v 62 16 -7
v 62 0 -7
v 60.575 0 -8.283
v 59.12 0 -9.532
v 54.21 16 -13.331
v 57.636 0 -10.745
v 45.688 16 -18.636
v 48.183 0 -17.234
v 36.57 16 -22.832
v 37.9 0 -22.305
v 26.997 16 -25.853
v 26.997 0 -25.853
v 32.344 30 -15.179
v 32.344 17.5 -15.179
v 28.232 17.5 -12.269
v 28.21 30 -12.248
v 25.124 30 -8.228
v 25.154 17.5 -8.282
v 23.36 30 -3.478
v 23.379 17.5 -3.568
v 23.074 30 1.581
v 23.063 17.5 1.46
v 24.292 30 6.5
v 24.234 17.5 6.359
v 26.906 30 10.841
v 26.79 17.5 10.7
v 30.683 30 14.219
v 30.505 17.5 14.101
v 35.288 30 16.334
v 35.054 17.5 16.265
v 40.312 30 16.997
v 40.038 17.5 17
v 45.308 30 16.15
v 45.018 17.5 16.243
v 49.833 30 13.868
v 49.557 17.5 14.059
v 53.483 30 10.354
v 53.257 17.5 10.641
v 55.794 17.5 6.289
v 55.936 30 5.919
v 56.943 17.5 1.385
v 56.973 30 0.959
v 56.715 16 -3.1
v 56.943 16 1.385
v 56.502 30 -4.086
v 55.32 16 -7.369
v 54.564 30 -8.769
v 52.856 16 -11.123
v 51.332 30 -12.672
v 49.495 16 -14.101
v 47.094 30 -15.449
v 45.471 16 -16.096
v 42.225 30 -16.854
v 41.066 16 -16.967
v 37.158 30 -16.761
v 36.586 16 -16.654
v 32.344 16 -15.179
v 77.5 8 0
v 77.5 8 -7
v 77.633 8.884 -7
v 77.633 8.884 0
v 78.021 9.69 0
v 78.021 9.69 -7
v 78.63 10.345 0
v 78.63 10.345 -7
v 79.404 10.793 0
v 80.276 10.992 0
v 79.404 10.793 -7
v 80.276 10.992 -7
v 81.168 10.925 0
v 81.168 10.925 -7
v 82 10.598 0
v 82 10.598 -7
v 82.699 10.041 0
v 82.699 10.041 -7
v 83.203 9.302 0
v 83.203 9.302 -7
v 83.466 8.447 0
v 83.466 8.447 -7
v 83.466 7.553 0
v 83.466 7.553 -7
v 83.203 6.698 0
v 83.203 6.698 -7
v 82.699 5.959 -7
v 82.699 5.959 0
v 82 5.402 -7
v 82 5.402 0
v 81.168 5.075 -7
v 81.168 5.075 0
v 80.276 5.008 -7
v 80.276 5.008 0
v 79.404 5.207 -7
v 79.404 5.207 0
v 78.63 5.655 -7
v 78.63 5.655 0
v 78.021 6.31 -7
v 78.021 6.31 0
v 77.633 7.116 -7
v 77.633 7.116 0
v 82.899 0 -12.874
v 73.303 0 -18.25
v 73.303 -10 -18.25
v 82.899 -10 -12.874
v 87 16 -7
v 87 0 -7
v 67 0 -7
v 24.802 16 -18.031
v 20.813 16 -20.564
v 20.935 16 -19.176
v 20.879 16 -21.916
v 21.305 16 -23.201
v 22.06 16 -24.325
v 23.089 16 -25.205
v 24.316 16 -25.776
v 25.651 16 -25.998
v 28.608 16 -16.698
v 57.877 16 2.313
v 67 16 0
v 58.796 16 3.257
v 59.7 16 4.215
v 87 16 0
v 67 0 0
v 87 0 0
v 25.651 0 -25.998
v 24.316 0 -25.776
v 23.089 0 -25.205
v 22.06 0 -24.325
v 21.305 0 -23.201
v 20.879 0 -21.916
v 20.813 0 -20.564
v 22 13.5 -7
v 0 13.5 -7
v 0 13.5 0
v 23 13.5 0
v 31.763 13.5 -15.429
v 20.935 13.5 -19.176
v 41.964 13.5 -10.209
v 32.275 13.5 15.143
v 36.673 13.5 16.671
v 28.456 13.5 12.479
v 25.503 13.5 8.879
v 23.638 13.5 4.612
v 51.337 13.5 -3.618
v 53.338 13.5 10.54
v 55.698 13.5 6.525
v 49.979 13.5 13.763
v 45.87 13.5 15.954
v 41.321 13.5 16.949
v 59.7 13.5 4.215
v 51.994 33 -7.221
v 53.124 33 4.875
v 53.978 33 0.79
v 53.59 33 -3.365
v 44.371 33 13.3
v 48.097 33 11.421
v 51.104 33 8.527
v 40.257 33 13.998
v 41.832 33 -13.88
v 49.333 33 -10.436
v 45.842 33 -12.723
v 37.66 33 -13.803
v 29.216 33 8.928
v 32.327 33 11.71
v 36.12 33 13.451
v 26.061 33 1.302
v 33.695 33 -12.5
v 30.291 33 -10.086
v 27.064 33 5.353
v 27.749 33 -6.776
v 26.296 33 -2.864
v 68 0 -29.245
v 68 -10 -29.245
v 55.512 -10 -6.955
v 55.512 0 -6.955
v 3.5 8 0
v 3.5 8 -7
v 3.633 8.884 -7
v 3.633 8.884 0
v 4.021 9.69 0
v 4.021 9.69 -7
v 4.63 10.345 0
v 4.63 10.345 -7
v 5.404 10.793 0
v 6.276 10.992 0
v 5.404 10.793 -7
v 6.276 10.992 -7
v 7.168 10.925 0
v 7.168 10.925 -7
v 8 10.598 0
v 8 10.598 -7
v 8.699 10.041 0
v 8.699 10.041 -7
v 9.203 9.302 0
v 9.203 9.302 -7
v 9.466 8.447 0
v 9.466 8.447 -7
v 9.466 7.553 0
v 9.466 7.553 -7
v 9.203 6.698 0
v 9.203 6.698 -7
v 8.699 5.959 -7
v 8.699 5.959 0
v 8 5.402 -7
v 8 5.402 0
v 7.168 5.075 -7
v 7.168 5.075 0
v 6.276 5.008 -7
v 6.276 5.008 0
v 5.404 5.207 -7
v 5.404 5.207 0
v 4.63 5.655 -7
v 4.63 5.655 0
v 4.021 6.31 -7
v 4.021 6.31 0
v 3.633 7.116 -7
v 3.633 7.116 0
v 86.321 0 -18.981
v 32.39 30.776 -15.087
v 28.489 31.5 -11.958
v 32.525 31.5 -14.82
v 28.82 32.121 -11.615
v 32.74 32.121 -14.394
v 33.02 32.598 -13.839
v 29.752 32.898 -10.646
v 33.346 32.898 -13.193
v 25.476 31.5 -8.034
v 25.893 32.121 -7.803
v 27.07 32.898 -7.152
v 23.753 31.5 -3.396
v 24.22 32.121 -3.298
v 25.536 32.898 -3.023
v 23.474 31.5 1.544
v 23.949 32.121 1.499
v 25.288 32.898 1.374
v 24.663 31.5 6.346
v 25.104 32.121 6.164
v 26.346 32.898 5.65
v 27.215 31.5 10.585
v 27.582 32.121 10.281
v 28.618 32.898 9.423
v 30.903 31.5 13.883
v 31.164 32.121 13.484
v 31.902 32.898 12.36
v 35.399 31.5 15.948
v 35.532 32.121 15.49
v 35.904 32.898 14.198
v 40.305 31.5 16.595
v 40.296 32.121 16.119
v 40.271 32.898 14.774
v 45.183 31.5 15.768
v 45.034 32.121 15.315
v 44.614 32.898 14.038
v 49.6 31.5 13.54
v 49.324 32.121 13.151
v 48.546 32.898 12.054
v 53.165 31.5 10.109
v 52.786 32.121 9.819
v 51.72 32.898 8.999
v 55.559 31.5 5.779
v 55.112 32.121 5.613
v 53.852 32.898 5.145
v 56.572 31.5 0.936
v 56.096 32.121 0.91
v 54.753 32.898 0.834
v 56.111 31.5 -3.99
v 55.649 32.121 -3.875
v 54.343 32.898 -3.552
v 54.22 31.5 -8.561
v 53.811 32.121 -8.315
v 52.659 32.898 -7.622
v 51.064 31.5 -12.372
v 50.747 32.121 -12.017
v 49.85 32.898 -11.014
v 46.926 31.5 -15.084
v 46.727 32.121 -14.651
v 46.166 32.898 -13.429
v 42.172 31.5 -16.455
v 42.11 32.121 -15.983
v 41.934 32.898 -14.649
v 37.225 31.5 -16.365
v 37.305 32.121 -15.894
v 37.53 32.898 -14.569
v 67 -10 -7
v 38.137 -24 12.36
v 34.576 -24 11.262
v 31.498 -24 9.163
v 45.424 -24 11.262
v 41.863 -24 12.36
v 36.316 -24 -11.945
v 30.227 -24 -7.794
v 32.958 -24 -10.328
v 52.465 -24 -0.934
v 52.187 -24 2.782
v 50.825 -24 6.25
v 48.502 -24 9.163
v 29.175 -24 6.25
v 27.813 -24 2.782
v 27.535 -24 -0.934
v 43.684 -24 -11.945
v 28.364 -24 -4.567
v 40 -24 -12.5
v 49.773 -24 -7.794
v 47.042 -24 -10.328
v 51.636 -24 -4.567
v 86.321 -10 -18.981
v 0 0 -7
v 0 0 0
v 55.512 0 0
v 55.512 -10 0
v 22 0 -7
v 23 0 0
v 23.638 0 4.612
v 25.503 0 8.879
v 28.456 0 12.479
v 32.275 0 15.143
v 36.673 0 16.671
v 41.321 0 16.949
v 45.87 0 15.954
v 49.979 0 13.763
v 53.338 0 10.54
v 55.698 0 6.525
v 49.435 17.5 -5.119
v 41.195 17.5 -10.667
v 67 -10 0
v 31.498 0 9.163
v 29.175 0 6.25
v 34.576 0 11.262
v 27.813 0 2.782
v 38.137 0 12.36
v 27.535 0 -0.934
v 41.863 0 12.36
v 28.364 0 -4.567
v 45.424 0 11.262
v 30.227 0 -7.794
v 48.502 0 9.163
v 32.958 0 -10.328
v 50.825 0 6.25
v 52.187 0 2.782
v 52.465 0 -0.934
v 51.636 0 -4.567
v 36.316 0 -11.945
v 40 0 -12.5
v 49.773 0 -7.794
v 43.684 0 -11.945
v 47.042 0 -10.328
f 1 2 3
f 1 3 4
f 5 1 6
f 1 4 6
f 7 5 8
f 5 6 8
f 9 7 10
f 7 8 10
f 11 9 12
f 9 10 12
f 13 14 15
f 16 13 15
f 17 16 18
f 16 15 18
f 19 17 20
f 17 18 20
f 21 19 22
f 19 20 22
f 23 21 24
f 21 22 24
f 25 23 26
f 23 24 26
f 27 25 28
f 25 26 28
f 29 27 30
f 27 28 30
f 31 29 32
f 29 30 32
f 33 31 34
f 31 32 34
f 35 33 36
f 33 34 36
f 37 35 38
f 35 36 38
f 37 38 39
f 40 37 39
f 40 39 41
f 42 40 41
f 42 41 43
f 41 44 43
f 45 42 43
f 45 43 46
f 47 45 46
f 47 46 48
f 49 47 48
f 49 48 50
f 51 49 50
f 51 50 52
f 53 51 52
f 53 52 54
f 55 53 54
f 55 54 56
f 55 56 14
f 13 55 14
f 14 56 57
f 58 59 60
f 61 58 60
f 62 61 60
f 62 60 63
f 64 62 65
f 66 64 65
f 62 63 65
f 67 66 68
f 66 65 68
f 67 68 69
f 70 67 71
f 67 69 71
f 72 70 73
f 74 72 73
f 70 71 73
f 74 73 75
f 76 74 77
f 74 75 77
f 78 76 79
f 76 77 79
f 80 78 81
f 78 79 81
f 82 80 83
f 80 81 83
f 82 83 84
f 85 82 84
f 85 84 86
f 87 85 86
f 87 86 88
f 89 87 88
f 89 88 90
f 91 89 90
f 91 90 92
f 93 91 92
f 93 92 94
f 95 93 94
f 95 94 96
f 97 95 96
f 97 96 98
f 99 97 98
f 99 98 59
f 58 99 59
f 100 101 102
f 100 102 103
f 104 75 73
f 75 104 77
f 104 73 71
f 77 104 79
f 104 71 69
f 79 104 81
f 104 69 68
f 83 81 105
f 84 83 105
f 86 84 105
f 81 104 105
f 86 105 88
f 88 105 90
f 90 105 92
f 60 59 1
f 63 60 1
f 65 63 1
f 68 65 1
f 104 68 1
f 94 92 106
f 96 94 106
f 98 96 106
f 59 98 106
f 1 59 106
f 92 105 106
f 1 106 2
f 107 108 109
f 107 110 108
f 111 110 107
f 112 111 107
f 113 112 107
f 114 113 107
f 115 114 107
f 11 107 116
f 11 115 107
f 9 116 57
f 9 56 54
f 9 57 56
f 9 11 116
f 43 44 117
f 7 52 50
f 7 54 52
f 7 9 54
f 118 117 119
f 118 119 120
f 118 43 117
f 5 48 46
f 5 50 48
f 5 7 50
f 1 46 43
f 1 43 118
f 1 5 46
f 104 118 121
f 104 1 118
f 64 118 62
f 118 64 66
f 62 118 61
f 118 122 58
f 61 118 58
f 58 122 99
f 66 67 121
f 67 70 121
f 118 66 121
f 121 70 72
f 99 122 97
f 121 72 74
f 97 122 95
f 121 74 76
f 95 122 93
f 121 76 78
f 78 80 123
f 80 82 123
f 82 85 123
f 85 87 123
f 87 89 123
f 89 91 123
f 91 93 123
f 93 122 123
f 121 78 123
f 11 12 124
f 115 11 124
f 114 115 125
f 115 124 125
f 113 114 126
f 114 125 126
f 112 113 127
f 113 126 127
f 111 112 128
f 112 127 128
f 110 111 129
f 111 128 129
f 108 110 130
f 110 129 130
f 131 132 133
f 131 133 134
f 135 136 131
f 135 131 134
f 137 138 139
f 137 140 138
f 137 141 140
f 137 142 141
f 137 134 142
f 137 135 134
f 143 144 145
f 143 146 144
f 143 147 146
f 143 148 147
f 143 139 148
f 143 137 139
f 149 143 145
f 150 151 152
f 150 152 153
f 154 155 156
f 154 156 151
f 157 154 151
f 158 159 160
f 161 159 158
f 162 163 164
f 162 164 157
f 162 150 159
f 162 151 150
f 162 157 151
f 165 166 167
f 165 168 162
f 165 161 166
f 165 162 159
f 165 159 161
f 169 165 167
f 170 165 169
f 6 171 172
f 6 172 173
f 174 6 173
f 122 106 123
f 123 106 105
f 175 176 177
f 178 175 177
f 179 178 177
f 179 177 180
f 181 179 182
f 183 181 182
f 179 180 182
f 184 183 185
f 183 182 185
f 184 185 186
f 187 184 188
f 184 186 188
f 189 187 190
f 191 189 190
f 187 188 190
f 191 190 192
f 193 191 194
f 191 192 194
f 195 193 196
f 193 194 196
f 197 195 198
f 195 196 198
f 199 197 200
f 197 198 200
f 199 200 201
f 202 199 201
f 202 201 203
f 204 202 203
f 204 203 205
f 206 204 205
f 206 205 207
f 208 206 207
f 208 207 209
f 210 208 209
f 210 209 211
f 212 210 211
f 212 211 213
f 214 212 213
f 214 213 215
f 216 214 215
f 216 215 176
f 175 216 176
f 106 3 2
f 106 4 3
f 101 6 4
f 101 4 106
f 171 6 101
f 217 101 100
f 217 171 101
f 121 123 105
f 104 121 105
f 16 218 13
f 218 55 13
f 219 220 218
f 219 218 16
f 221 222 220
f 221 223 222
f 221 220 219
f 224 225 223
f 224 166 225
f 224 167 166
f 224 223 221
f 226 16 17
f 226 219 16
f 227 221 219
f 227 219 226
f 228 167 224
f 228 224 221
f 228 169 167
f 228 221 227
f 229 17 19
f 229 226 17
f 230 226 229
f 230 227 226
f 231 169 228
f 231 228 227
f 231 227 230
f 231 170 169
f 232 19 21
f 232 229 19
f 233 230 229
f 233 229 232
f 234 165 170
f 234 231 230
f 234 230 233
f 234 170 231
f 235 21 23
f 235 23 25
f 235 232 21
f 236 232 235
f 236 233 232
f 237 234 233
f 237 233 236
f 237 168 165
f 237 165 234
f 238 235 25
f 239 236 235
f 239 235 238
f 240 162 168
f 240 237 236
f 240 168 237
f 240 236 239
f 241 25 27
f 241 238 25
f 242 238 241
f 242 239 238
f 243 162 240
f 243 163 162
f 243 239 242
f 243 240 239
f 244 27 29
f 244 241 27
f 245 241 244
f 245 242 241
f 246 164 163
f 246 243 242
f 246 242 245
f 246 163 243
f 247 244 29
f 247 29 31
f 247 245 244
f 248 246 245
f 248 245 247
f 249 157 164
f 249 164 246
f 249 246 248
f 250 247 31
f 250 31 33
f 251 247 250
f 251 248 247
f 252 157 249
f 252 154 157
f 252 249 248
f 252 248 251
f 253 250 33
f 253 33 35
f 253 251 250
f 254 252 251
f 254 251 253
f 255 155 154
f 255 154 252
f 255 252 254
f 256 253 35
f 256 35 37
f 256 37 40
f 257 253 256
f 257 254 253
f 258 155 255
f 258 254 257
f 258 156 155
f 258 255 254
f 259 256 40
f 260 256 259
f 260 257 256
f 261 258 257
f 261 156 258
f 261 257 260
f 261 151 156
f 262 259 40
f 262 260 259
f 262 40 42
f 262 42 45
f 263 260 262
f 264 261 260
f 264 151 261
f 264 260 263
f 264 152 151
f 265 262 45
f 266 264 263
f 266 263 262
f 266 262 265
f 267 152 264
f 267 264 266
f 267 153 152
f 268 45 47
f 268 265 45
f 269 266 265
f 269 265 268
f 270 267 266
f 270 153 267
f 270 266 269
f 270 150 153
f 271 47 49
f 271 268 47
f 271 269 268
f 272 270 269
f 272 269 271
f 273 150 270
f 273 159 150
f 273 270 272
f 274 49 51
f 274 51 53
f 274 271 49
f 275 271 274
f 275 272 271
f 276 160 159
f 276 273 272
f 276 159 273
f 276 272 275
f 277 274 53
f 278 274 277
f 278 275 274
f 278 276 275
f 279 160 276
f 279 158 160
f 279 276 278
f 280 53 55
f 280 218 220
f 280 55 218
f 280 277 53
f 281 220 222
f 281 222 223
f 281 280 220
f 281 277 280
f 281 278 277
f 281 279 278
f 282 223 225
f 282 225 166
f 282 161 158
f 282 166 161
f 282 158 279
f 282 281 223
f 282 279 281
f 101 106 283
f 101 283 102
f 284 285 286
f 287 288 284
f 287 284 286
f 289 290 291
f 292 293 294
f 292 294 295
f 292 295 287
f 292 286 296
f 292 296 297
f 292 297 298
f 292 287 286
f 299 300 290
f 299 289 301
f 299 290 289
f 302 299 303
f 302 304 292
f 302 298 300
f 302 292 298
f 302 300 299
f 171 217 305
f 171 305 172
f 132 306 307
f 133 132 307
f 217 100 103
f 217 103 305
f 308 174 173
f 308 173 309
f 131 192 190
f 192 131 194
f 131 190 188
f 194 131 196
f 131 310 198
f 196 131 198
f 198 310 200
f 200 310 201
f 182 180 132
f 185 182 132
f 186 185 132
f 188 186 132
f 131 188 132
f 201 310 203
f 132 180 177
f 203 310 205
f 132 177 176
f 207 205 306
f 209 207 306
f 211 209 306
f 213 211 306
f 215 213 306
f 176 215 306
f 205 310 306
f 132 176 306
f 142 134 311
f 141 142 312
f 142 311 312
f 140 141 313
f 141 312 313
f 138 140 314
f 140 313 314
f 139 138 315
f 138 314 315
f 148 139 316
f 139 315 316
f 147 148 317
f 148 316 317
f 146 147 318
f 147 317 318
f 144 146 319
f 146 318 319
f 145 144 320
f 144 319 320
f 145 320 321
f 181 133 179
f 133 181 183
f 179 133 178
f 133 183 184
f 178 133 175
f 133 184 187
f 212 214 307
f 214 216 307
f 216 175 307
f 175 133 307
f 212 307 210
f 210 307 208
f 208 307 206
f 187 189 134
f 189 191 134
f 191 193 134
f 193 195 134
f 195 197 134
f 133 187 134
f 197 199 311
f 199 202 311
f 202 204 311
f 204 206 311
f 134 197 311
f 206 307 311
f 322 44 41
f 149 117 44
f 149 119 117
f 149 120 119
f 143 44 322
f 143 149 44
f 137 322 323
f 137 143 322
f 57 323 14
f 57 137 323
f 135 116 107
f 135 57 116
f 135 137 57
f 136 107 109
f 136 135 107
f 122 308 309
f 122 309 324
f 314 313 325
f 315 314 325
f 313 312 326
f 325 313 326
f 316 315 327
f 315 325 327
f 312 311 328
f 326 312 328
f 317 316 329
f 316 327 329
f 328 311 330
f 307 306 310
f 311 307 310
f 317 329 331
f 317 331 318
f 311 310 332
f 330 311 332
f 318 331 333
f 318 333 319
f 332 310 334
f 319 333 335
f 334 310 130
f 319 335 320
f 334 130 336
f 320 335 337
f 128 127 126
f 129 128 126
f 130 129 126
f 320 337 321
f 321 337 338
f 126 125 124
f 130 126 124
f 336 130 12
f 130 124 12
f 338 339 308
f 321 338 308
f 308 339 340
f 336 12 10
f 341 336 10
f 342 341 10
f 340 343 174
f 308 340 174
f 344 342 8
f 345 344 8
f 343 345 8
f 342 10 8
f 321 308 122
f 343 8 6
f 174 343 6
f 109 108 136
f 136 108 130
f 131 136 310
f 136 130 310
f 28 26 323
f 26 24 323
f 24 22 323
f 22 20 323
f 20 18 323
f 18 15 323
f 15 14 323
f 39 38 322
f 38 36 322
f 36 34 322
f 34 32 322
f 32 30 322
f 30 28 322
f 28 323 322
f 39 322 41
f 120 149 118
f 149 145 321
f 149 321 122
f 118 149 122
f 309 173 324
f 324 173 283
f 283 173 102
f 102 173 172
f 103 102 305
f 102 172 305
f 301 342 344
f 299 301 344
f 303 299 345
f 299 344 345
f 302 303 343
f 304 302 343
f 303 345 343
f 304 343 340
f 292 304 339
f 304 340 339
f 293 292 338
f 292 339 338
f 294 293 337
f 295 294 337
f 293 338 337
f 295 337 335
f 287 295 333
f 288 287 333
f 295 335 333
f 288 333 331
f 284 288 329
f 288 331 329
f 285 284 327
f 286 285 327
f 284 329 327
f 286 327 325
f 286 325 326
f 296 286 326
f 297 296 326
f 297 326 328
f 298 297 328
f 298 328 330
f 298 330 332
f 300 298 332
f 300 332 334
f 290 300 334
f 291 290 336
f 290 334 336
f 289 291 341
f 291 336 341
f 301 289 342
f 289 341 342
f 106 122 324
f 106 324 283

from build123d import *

# Parameters (mm, degrees)
BOSS_EXTRUDE1_DEPTH = 16
SKETCH2_R           = 17
BOSS_EXTRUDE2_DEPTH = 17
SKETCH3_R           = 12.5
BOSS_EXTRUDE3_DEPTH = 24
SKETCH4_R           = 3
CUT_EXTRUDE1_DEPTH  = 97.093704268
BOSS_EXTRUDE5_DEPTH = 10
SKETCH7_R           = 82
CUT_EXTRUDE2_DEPTH  = 4
FILLET1_R           = 3


with BuildPart() as part:
    # Sketch1 → Boss-Extrude1 (new body)
    with BuildSketch(Plane(origin=(0, 0, 0), x_dir=(1, 0, 0), z_dir=(0, 1, 0))):
        with BuildLine():
            Line((0, 0), (23, 0))
            ThreePointArc((23, 0), (36.672989813, -16.671262796), (55.697765084, -6.525348371))
            Line((55.697765084, -6.525348371), (67, 0))
            Line((67, 0), (87, 0))
            Line((87, 0), (87, 7))
            Line((87, 7), (62, 7))
            ThreePointArc((62, 7), (45.688374241, 18.635635799), (26.997081597, 25.853165477))
            ThreePointArc((26.997081597, 25.853165477), (22.544359958, 24.799758331), (20.813284408, 20.564221286))
            Line((20.813284408, 20.564221286), (22, 7))
            Line((22, 7), (0, 7))
            Line((0, 7), (0, 0))
        make_face()
    extrude(amount=BOSS_EXTRUDE1_DEPTH)

    # Sketch2 → Boss-Extrude2 (add)
    with BuildSketch(Plane(origin=(0, 16, 0), x_dir=(1, 0, 0), z_dir=(0, 1, 0))):
        with Locations(Location((40, 0, 0), (0, 0, 116.765541629))):
            Circle(SKETCH2_R)
    extrude(amount=BOSS_EXTRUDE2_DEPTH)

    # Sketch3 → Boss-Extrude3 (add)
    with BuildSketch(Plane.XZ):
        with Locations(Location((40, 0, 0), (0, 0, 270))):
            Circle(SKETCH3_R)
    extrude(amount=BOSS_EXTRUDE3_DEPTH)

    # Sketch4 → Cut-Extrude1 (cut, through all)
    with BuildSketch(Plane(origin=(0, 0, -7), x_dir=(-1, 0, 0), z_dir=(0, 0, -1))):
        with Locations((-80.5, 8)):
            Circle(SKETCH4_R)
        with Locations((-6.5, 8)):
            Circle(SKETCH4_R)
    extrude(amount=-CUT_EXTRUDE1_DEPTH, mode=Mode.SUBTRACT)

    # Sketch5 → Boss-Extrude5 (add)
    with BuildSketch(Plane(origin=(0, 0, 0), x_dir=(1, 0, 0), z_dir=(0, 1, 0))):
        Polygon((67, 7), (73.302829045, 18.25023255), (82.899413644, 12.873843052), (86.320752416, 18.980760523), (68, 29.244776839), (55.512272379, 6.954811689), (55.512272379, 0), (67, 0), align=None)
    extrude(amount=-BOSS_EXTRUDE5_DEPTH)

    # Sketch7 → Cut-Extrude2 (cut)
    with BuildSketch(Plane(origin=(0, 13.5, 0), x_dir=(1, 0, 0), z_dir=(0, 1, 0))):
        with Locations((-0.4, -60)):
            Circle(SKETCH7_R)
    extrude(amount=CUT_EXTRUDE2_DEPTH, mode=Mode.SUBTRACT)

    # Fillet1
    fillet1_edges = [part.edges().sort_by_distance(p)[0] for p in [
        (47.655791005, 33, 15.178565943),
    ]]
    fillet(fillet1_edges, radius=FILLET1_R)


solid = part.part
